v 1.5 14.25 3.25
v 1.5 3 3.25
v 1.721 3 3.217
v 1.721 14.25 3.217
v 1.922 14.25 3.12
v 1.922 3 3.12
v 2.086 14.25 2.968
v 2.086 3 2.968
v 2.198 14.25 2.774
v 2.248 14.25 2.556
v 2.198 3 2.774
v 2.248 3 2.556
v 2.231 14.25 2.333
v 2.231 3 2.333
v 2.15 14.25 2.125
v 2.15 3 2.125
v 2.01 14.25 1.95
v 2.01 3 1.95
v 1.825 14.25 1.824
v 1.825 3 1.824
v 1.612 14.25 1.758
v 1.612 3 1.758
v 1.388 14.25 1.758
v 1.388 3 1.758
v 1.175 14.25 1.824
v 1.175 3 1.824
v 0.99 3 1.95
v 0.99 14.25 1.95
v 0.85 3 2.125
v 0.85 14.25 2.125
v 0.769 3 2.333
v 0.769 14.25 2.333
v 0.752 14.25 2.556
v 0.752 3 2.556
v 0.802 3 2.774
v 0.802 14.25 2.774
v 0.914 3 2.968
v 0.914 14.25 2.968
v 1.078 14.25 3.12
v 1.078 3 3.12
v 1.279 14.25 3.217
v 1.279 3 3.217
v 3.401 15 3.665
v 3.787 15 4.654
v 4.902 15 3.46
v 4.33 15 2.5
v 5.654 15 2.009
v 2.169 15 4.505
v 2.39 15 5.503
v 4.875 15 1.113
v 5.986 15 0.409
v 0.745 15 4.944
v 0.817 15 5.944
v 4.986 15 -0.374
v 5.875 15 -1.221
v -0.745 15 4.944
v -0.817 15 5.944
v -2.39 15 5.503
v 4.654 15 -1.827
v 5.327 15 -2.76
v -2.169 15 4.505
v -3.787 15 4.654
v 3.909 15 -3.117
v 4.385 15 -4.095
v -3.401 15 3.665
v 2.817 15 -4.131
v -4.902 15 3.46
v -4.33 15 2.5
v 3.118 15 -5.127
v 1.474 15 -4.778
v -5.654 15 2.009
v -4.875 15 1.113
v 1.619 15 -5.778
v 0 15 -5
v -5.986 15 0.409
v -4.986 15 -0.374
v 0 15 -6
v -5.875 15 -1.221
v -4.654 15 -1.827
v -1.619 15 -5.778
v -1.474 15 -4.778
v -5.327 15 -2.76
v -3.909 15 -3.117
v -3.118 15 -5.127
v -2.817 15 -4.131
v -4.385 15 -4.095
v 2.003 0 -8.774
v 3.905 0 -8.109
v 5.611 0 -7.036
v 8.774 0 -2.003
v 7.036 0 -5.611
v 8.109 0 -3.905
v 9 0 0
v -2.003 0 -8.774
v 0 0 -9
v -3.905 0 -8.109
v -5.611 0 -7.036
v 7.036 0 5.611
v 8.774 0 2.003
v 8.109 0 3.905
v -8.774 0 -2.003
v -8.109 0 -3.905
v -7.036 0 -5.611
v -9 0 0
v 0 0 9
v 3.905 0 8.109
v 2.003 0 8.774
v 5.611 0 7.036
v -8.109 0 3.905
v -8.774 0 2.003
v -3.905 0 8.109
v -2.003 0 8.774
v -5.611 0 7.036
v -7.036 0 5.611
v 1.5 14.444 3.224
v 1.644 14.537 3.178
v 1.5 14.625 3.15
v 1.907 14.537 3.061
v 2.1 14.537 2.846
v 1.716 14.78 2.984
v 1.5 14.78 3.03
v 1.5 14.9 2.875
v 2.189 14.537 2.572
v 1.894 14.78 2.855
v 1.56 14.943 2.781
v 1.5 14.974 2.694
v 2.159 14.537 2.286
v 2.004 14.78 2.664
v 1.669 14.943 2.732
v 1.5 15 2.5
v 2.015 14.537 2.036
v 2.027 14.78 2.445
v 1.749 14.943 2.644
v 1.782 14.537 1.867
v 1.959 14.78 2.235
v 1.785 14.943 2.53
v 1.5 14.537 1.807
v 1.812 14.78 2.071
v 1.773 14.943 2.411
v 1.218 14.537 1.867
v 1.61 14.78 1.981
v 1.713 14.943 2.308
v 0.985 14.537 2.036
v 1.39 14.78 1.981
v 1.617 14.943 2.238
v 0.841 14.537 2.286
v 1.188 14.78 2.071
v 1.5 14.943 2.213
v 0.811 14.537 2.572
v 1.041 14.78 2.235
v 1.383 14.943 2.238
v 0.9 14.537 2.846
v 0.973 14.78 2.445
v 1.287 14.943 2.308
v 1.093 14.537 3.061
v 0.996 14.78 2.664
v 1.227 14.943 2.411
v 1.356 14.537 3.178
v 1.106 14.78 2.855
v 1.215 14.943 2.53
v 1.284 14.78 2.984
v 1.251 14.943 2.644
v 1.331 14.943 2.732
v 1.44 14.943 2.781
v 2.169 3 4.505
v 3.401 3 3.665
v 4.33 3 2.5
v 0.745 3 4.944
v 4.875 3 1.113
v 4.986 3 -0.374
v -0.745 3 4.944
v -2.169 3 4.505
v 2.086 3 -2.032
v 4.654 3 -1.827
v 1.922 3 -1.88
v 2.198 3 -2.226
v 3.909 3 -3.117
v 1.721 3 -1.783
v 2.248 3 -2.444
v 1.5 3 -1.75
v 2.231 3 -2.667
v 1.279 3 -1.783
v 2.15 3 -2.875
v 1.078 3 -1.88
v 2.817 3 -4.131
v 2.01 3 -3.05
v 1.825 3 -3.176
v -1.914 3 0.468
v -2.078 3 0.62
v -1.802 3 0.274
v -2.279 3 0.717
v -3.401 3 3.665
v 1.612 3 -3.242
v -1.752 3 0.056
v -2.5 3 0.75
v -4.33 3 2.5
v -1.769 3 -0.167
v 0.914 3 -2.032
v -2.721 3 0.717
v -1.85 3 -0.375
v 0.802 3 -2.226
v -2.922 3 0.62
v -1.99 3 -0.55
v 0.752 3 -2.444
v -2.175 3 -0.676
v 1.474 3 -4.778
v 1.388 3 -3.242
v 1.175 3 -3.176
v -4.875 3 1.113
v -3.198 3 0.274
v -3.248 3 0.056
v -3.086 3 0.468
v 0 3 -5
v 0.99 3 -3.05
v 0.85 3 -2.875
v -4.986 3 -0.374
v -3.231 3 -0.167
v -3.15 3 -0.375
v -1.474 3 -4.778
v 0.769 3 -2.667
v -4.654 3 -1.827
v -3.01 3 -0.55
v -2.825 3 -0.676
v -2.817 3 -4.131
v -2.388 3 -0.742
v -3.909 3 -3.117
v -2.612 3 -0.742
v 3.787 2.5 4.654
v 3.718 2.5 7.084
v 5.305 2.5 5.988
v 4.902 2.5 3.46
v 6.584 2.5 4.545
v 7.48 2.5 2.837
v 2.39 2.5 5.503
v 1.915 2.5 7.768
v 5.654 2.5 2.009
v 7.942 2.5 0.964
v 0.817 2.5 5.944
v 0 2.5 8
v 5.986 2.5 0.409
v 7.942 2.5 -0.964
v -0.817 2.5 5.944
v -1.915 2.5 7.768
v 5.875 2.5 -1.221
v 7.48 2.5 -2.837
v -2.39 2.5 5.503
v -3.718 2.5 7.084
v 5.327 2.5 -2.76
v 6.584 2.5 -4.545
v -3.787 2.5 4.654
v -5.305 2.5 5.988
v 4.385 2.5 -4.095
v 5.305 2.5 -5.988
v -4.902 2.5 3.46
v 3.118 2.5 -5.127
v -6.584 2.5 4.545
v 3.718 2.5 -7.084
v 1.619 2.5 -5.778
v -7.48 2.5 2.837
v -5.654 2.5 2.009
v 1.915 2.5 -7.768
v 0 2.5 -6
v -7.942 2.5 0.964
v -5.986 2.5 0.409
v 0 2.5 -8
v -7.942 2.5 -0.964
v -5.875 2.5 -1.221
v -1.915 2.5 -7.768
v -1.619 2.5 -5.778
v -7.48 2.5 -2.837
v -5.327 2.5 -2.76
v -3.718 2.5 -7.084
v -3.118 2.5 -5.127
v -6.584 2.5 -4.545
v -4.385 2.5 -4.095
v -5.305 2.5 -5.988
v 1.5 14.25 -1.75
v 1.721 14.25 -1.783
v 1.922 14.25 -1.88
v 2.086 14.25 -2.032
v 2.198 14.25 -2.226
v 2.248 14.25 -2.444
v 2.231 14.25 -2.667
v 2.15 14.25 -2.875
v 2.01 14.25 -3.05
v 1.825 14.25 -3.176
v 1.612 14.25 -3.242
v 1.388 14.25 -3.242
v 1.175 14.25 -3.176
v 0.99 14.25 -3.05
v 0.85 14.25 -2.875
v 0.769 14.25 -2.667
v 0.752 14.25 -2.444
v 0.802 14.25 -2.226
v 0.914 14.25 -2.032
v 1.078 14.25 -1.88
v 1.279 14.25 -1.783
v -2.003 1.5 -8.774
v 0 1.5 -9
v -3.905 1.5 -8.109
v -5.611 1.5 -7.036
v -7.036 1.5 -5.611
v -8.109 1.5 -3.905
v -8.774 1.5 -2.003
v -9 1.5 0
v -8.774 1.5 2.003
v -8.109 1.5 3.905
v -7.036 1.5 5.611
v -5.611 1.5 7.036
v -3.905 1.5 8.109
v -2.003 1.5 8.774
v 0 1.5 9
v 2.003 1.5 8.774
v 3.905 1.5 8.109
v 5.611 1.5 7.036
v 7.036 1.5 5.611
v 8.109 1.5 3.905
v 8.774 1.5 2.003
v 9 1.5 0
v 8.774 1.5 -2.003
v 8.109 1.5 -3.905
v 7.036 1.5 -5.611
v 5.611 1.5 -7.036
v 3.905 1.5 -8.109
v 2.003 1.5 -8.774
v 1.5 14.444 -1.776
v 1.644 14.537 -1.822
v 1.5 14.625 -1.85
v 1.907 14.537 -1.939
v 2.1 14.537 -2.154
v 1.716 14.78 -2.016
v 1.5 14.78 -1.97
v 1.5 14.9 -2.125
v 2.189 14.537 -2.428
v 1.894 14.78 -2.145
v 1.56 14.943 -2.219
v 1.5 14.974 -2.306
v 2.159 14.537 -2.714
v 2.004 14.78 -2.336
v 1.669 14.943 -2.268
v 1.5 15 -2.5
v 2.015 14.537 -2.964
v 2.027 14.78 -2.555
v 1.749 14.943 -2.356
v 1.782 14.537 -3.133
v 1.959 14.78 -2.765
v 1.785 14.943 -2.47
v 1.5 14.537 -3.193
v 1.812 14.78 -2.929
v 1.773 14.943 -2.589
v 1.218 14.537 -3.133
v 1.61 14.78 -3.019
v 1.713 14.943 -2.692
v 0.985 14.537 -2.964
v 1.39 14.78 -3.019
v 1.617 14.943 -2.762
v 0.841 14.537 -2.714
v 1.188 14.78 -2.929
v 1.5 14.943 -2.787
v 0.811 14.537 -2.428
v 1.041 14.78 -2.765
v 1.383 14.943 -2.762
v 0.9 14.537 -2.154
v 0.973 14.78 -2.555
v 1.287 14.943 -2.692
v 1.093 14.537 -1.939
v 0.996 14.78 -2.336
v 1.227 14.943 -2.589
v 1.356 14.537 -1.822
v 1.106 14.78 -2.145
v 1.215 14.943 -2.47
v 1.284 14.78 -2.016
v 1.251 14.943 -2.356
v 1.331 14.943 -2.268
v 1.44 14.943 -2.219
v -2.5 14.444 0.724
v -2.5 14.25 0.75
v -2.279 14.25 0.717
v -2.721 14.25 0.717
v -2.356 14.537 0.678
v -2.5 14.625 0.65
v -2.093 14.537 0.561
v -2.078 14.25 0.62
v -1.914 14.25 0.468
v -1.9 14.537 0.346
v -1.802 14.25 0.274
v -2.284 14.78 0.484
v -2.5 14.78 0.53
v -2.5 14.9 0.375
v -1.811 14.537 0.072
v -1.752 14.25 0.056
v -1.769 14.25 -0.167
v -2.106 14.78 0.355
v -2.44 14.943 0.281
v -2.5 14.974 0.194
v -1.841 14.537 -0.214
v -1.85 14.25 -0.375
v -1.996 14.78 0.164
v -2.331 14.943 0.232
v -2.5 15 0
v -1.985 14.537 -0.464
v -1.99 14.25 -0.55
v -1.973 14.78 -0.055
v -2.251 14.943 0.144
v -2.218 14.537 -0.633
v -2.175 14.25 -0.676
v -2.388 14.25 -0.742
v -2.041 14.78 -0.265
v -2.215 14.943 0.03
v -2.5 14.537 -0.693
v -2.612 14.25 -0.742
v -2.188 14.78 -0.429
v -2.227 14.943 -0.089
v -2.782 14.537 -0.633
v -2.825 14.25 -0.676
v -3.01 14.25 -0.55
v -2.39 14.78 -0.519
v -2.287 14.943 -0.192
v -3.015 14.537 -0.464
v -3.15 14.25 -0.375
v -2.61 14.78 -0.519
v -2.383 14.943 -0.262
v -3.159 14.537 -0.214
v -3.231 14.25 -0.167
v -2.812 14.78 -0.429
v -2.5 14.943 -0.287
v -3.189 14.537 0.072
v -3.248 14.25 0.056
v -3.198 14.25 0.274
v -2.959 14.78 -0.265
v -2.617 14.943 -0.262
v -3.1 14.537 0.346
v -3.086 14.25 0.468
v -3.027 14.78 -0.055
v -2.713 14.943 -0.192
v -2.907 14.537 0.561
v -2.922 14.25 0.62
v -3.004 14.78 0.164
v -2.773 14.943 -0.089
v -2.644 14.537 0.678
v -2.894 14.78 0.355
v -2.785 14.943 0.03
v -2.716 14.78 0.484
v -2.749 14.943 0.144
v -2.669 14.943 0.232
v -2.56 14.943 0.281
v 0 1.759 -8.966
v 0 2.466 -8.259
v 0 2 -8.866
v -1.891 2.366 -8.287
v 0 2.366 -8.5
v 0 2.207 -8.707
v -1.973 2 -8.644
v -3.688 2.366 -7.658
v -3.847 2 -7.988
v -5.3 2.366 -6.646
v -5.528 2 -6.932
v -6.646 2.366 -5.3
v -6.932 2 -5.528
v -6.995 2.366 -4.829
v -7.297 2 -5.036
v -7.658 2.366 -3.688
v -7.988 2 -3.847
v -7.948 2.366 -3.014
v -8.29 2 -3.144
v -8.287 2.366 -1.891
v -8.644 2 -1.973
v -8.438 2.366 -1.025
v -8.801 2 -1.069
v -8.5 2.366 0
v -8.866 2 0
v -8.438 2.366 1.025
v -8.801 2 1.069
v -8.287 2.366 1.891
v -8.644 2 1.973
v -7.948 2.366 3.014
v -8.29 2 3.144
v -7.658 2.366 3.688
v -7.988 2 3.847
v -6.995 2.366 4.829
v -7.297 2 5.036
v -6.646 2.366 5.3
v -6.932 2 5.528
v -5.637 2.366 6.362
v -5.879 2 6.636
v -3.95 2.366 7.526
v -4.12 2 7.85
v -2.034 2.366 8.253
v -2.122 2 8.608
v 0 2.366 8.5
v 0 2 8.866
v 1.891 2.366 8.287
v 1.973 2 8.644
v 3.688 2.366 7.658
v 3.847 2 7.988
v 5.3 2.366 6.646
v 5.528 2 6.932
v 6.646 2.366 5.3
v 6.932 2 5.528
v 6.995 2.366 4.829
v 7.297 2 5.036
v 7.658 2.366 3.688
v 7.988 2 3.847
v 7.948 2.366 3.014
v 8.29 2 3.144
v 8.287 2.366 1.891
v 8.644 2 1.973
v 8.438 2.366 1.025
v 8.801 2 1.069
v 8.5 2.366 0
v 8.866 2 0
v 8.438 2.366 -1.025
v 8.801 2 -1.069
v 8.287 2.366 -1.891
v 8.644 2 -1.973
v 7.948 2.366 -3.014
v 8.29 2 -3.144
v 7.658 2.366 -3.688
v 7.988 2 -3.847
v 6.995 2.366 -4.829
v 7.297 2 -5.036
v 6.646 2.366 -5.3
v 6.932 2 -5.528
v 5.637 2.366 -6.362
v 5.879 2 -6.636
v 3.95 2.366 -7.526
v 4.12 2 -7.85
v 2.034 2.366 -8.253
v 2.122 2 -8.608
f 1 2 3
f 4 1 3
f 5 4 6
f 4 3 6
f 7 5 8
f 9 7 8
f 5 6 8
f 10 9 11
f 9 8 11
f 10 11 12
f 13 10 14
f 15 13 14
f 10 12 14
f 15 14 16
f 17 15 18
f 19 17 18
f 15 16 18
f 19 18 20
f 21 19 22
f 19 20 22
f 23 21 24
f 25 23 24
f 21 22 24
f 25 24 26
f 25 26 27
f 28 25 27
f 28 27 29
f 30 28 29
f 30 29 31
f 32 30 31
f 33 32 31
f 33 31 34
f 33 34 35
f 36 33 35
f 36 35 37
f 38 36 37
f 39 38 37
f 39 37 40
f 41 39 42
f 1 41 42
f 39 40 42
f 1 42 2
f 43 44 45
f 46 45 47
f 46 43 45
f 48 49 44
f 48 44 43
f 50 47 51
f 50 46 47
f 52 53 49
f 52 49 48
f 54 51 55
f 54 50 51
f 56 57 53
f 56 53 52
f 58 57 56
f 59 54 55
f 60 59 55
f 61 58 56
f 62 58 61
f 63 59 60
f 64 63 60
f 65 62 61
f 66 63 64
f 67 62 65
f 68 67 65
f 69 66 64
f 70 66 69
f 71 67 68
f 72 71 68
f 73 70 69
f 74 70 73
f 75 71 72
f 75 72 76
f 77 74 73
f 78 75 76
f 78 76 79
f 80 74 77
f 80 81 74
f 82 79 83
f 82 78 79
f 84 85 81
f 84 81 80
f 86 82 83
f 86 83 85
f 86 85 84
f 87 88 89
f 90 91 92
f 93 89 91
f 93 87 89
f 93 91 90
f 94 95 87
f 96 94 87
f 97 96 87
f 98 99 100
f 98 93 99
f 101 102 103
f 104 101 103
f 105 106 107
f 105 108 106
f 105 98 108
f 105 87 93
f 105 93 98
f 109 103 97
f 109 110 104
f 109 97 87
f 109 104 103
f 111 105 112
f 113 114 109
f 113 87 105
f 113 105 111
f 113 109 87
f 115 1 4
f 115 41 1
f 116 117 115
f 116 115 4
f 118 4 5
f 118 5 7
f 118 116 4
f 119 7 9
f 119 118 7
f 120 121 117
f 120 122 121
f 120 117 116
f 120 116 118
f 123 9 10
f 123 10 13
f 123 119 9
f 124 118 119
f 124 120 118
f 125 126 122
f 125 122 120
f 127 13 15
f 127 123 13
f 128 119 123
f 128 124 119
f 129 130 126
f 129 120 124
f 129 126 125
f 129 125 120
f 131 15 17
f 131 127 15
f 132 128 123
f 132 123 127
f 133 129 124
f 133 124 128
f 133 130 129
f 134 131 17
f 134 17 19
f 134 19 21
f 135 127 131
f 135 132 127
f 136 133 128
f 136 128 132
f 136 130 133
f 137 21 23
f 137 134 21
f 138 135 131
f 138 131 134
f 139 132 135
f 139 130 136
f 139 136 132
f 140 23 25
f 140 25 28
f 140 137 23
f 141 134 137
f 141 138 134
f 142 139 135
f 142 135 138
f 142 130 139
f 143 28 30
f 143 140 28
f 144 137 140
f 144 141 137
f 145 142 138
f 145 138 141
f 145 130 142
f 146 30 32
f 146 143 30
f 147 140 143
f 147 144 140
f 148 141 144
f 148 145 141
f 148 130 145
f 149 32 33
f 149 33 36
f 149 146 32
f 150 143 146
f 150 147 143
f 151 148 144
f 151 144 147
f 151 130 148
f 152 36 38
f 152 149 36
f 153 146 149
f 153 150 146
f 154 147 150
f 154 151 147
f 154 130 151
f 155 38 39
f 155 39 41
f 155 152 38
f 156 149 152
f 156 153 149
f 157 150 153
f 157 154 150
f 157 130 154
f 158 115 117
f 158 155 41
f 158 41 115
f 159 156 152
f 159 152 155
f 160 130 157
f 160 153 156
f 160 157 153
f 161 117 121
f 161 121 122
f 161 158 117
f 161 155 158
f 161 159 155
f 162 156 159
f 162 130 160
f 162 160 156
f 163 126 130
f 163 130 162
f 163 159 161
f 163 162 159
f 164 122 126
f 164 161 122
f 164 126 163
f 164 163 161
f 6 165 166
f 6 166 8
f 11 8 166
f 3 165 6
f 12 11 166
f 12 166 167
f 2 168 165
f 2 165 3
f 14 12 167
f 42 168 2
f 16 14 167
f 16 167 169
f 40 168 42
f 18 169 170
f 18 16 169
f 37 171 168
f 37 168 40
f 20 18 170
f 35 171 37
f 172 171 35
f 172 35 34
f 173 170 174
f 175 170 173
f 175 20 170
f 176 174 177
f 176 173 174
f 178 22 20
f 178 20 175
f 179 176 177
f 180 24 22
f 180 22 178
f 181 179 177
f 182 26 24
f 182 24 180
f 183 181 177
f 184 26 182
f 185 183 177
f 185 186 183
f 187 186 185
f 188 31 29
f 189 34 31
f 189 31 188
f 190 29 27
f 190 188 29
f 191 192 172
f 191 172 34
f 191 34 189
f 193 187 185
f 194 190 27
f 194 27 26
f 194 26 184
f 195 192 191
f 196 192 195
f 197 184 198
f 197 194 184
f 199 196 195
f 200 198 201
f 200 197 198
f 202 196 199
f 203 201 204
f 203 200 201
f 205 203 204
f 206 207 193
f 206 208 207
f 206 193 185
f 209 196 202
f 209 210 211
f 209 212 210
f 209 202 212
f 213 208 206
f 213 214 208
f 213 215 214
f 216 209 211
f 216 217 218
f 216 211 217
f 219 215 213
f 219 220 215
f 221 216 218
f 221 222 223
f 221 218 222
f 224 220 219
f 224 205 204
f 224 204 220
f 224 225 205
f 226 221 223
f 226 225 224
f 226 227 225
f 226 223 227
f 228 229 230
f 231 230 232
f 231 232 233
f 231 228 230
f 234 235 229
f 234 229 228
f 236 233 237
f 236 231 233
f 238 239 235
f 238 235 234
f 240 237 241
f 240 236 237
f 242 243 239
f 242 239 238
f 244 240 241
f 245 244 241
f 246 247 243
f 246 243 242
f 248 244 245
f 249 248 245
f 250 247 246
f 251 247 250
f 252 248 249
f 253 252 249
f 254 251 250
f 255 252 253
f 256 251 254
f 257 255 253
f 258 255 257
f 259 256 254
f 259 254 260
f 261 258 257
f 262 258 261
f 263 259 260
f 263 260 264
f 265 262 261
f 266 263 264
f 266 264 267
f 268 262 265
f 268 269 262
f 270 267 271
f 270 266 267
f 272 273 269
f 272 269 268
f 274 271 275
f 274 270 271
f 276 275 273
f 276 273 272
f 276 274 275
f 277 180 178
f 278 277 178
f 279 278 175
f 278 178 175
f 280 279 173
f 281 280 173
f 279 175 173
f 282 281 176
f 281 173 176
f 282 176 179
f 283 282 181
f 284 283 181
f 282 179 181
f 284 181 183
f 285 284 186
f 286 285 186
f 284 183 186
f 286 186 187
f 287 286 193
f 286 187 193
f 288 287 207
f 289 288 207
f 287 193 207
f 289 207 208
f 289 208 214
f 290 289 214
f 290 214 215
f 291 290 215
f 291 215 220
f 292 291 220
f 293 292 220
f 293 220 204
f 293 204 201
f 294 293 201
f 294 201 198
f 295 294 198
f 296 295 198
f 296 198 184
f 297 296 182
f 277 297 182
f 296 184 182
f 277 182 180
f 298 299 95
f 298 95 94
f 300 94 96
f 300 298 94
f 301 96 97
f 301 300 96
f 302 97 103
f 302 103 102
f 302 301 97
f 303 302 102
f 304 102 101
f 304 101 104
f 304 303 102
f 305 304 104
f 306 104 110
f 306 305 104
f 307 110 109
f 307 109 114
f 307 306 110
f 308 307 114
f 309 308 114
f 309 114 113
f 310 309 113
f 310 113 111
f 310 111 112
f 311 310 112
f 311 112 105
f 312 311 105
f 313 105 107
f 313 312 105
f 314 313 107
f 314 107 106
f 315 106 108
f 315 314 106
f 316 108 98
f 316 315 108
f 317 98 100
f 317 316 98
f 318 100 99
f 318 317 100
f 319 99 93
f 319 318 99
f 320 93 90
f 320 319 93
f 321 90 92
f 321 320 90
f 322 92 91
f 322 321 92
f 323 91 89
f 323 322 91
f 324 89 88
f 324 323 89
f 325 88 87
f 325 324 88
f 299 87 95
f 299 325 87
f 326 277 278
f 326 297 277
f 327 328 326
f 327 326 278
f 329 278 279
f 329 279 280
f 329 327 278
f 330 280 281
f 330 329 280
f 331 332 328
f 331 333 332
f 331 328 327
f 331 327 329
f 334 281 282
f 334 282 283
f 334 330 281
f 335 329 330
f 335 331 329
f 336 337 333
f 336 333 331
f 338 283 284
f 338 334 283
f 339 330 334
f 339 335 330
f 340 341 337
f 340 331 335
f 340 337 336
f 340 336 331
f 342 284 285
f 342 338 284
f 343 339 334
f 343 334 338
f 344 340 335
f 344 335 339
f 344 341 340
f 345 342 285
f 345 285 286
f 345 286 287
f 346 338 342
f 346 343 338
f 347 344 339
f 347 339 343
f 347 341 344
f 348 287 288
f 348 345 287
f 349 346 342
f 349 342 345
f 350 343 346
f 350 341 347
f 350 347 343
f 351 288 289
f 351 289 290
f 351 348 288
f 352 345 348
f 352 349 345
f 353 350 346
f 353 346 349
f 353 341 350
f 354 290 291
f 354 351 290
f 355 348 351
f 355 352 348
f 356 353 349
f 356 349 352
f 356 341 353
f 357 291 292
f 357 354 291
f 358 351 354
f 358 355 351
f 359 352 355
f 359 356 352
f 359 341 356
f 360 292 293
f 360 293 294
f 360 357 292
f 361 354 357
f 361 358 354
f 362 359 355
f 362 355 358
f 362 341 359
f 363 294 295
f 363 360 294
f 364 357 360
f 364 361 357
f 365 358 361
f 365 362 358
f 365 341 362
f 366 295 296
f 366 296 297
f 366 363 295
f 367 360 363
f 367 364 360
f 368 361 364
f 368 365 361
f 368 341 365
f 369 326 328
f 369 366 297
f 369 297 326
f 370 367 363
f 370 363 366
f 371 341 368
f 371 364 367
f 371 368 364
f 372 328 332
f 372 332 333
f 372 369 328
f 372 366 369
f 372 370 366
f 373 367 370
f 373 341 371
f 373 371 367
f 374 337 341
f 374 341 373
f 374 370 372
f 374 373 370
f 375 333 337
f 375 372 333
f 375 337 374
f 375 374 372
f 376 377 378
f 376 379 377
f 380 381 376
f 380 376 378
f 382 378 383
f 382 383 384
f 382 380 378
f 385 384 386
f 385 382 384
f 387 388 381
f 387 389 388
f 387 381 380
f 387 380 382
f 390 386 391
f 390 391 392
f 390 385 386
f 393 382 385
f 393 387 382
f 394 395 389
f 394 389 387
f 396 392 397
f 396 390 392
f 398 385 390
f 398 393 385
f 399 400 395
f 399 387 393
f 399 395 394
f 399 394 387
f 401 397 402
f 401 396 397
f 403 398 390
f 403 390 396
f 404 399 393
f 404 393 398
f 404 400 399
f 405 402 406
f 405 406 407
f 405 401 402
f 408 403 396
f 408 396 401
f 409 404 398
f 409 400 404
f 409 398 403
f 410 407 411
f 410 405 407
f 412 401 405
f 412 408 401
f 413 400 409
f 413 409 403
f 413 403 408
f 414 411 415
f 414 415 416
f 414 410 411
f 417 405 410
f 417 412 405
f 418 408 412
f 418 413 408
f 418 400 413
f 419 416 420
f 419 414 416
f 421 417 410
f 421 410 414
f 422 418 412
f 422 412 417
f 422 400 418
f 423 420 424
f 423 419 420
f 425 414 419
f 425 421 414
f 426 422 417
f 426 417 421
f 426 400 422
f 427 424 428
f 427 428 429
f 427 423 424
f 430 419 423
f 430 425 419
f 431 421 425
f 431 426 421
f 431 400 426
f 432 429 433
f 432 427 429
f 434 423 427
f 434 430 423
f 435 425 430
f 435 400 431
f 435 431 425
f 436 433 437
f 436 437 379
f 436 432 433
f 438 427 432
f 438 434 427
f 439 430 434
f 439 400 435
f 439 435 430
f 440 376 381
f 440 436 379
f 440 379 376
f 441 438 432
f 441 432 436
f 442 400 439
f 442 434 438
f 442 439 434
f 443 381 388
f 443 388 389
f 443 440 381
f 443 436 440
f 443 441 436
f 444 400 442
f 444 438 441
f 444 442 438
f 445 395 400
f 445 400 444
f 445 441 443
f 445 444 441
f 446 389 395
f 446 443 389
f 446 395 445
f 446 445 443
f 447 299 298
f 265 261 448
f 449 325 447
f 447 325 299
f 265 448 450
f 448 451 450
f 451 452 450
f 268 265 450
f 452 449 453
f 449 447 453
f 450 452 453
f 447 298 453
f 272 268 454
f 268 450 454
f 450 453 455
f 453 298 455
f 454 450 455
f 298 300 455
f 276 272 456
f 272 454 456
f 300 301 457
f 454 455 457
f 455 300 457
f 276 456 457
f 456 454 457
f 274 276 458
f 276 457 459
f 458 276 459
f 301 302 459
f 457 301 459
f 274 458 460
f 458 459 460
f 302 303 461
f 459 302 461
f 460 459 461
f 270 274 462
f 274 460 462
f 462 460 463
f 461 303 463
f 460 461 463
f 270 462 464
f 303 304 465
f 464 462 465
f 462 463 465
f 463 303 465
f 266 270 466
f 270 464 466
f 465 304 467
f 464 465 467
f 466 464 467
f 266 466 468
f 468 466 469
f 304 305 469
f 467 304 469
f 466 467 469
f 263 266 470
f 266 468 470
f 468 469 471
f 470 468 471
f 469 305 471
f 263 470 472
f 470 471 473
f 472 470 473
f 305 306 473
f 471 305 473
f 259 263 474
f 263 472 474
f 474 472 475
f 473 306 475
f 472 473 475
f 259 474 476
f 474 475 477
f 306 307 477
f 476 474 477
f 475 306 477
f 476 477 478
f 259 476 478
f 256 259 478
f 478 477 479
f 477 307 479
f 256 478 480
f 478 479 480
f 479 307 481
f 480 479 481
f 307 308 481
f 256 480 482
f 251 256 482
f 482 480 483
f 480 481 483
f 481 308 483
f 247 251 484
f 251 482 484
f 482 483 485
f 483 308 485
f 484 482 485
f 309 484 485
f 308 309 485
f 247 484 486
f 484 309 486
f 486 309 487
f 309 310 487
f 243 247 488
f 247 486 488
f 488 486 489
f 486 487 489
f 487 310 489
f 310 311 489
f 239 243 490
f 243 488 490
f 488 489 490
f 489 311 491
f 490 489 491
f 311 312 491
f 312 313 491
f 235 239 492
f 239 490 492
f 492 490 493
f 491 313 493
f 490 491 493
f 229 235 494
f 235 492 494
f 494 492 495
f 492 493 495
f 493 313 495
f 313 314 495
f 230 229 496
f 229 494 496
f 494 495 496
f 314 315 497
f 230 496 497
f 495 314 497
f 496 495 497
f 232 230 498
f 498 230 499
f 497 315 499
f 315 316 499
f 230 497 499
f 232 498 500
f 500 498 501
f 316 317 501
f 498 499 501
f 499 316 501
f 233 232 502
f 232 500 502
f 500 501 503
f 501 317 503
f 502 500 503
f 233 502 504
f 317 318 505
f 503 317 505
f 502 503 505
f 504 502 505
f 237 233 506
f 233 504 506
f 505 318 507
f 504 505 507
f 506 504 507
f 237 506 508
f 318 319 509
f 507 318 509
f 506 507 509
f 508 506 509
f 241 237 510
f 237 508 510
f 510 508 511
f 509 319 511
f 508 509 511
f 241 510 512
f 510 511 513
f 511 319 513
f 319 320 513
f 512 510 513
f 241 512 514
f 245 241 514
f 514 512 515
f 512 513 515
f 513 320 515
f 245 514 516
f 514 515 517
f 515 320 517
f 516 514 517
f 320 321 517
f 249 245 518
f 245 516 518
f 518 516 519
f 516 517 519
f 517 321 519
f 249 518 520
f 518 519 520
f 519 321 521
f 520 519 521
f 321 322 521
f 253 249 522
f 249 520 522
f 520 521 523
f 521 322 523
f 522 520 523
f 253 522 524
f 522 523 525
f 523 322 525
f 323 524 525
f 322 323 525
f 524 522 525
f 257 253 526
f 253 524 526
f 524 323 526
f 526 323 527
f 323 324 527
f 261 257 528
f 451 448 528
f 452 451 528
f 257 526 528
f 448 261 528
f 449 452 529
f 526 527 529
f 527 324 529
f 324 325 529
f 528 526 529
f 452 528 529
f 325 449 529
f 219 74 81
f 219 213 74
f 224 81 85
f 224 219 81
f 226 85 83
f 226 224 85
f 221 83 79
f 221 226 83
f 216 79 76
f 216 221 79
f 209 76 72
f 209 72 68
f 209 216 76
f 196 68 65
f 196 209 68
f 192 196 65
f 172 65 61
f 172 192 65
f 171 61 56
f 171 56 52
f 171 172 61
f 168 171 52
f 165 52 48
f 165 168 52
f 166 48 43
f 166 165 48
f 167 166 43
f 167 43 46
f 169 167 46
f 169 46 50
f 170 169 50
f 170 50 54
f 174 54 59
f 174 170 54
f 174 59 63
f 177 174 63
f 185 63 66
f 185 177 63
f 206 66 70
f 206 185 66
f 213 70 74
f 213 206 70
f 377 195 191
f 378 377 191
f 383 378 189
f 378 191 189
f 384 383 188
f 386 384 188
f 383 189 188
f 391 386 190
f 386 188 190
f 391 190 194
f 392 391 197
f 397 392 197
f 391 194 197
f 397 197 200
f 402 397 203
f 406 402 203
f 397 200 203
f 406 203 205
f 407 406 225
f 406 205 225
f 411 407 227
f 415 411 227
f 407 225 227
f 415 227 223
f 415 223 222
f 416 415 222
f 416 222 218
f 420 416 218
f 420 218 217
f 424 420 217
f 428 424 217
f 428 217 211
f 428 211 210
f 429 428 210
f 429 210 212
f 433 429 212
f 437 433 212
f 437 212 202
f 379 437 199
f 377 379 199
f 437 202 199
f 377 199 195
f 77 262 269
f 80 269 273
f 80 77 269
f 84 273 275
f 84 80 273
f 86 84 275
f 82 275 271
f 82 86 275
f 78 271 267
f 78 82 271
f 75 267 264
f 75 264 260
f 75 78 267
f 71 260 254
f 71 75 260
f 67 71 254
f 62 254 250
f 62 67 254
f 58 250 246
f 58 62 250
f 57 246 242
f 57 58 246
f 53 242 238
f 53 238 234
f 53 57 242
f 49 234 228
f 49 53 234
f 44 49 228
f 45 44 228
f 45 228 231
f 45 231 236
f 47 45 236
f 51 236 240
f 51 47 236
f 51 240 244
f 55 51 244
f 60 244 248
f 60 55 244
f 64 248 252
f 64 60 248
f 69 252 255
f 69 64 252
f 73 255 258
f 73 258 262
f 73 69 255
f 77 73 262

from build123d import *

# Parameters (mm, degrees)
SKETCH2_R           = 0.75
BOSS_EXTRUDE1_DEPTH = 12
FILLET1_R           = 0.75
FILLET2_R           = 1


with BuildPart() as part:
    # Sketch1 → Revolve1 (revolve)
    with BuildSketch(Plane.XY, mode=Mode.PRIVATE) as revolve1_sk:
        Polygon((0, 0), (9, 0), (9, 2.5), (6, 2.5), (6, 15), (5, 15), (5, 3), (0, 3), align=None)
    revolve(revolve1_sk.sketch.rotate(Axis((0, 0, 0), (0, 1, 0)), 90), axis=Axis((0, 0, 0), (0, 1, 0)))

    # Sketch2 → Boss-Extrude1 (add)
    with BuildSketch(Plane(origin=(0, 3, 0), x_dir=(1, 0, 0), z_dir=(0, 1, 0))):
        with Locations(Location((1.5, 2.5, 0), (0, 0, 270))):
            Circle(SKETCH2_R)
        with Locations(Location((1.5, -2.5, 0), (0, 0, 270))):
            Circle(SKETCH2_R)
        with Locations(Location((-2.5, 0, 0), (0, 0, 270))):
            Circle(SKETCH2_R)
    extrude(amount=BOSS_EXTRUDE1_DEPTH)

    # Fillet1
    fillet1_edges = [part.edges().sort_by_distance(p)[0] for p in [
        (1.5, 15, -3.25),
        (1.5, 15, 1.75),
        (-2.5, 15, -0.75),
    ]]
    fillet(fillet1_edges, radius=FILLET1_R)

    # Fillet2
    fillet2_edges = [part.edges().sort_by_distance(p)[0] for p in [
        (0, 2.5, 9),
    ]]
    fillet(fillet2_edges, radius=FILLET2_R)


solid = part.part
